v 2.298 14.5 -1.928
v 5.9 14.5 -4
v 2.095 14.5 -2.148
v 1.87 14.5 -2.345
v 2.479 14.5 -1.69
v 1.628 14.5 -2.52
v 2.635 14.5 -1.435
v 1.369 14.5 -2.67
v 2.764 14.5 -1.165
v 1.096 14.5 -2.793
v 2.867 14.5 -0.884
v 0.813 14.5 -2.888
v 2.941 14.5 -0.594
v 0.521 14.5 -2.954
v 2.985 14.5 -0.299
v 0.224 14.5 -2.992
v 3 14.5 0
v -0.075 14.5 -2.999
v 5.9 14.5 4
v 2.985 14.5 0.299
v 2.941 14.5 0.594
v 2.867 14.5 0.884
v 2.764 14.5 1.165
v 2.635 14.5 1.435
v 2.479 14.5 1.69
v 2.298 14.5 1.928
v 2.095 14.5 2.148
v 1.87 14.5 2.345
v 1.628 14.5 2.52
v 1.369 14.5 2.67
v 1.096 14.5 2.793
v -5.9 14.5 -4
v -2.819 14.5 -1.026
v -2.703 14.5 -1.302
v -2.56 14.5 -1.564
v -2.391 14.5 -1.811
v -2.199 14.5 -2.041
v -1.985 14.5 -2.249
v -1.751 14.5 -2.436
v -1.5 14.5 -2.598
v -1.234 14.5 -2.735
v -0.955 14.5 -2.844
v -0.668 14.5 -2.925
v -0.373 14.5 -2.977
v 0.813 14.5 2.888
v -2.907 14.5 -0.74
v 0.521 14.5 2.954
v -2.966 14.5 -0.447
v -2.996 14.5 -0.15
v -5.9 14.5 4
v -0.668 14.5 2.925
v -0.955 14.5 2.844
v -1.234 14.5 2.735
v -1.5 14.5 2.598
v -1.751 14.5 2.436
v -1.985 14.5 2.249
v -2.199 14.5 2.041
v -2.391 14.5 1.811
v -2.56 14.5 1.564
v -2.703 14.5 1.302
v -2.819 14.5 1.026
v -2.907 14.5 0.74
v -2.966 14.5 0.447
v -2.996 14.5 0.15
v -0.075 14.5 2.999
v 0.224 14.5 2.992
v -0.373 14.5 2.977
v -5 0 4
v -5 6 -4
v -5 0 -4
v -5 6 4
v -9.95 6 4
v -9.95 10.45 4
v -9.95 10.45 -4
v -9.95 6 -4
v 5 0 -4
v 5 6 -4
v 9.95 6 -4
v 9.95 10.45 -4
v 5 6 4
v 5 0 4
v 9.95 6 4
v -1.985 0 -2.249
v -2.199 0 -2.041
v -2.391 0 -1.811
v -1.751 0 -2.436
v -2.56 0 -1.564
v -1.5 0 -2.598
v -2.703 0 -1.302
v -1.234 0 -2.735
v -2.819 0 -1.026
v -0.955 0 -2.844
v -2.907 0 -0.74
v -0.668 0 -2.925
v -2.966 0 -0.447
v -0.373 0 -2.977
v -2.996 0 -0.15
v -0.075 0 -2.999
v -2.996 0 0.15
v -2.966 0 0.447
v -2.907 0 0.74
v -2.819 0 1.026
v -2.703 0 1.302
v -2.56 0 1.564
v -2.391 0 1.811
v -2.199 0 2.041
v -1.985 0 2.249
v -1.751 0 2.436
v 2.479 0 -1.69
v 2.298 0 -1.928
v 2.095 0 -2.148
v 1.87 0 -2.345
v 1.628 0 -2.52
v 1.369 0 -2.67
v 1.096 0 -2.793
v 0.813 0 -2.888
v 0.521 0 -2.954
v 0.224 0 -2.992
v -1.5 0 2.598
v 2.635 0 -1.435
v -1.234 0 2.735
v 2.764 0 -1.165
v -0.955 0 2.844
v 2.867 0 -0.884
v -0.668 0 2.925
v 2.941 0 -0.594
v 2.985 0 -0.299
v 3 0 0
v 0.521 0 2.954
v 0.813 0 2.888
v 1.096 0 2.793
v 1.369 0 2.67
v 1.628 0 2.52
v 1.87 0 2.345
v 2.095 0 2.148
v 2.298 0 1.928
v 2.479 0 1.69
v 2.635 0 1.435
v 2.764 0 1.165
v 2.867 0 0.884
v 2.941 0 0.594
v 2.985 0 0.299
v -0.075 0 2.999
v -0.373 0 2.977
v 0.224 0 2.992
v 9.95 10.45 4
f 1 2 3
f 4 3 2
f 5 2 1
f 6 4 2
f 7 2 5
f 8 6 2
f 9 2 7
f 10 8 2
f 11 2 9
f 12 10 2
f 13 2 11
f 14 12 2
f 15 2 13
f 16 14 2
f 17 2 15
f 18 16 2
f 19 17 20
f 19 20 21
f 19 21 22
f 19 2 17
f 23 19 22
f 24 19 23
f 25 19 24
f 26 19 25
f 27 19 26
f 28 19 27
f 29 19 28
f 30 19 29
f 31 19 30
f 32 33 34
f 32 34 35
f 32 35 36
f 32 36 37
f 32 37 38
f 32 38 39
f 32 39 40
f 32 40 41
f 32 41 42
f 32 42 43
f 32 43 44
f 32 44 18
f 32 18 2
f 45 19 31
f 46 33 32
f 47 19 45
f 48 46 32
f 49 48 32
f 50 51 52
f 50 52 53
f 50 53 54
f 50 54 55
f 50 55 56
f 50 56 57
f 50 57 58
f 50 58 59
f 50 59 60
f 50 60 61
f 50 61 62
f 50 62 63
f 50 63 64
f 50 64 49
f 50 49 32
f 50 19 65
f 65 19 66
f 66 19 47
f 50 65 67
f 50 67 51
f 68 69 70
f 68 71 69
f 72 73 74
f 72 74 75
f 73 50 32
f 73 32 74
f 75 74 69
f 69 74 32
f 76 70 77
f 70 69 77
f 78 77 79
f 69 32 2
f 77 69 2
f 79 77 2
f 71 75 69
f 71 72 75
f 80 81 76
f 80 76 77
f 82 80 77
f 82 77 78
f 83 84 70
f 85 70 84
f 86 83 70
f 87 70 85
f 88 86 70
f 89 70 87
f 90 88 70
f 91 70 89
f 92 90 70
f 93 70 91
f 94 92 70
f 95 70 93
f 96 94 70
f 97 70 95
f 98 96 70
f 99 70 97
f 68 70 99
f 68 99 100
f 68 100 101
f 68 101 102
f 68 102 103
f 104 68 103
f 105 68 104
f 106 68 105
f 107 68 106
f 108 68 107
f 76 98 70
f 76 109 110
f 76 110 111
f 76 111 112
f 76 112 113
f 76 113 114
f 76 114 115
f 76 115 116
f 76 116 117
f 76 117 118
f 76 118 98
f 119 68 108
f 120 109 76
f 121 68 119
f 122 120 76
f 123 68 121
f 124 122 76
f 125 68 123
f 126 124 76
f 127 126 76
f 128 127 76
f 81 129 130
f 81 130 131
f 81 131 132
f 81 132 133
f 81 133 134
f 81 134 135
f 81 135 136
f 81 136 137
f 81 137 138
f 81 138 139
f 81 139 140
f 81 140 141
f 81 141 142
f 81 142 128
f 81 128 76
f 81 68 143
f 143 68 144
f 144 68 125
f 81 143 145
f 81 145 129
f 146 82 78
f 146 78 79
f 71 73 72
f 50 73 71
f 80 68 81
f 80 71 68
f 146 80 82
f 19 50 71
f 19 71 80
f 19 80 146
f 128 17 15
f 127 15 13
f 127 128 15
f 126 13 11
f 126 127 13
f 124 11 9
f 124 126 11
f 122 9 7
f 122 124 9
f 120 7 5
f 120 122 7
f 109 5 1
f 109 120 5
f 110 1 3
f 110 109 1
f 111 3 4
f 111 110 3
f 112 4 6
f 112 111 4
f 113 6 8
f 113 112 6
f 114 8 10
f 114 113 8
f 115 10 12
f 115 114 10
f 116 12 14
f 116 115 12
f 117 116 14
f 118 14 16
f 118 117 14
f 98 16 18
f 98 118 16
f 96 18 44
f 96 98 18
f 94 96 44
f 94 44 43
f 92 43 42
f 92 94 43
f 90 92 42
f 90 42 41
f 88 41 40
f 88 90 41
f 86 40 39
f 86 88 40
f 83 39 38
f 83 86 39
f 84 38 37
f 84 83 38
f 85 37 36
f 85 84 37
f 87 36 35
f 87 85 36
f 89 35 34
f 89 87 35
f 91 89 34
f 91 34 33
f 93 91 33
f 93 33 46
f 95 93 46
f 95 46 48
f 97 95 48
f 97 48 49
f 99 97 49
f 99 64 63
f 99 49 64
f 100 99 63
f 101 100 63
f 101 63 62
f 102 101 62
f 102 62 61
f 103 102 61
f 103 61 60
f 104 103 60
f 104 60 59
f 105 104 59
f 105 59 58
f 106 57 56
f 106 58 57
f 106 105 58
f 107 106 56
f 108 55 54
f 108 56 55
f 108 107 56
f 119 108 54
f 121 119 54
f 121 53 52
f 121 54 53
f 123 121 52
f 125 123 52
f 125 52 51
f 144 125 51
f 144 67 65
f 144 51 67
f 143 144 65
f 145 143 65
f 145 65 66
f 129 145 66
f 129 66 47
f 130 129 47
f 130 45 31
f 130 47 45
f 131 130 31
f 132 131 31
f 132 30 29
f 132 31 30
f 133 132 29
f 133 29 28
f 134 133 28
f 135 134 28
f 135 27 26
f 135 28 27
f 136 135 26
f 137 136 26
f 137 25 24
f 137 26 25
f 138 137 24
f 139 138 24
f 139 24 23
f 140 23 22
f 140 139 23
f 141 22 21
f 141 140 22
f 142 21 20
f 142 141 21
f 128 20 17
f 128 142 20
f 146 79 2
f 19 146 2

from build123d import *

# Parameters (mm, degrees)
EXTRUDE1_DEPTH     = 4
CUT_EXTRUDE1_REACH = 20.035
SKETCH2_R          = 3


with BuildPart() as part:
    # Sketch1 → Extrude1 (new, symmetric)
    with BuildSketch(Plane.XY):
        Polygon((-5, 0), (5, 0), (5, 6), (9.95, 6), (9.95, 10.45), (5.9, 14.5), (-5.9, 14.5), (-9.95, 10.45), (-9.95, 6), (-5, 6), align=None)
    extrude(amount=EXTRUDE1_DEPTH, both=True)

    # Sketch2 → Cut-Extrude1 (cut, up to next)
    with BuildSketch(Plane(origin=(0, 0, 0), x_dir=(1, 0, 0), z_dir=(0, 1, 0)), mode=Mode.PRIVATE) as cut_extrude1_sk1:
        Circle(SKETCH2_R)
    cut_extrude1_tool1 = extrude(cut_extrude1_sk1.sketch, amount=CUT_EXTRUDE1_REACH, mode=Mode.PRIVATE) & part.part
    add(cut_extrude1_tool1.solids().sort_by_distance((0, 0, 0))[0], mode=Mode.SUBTRACT)


solid = part.part
